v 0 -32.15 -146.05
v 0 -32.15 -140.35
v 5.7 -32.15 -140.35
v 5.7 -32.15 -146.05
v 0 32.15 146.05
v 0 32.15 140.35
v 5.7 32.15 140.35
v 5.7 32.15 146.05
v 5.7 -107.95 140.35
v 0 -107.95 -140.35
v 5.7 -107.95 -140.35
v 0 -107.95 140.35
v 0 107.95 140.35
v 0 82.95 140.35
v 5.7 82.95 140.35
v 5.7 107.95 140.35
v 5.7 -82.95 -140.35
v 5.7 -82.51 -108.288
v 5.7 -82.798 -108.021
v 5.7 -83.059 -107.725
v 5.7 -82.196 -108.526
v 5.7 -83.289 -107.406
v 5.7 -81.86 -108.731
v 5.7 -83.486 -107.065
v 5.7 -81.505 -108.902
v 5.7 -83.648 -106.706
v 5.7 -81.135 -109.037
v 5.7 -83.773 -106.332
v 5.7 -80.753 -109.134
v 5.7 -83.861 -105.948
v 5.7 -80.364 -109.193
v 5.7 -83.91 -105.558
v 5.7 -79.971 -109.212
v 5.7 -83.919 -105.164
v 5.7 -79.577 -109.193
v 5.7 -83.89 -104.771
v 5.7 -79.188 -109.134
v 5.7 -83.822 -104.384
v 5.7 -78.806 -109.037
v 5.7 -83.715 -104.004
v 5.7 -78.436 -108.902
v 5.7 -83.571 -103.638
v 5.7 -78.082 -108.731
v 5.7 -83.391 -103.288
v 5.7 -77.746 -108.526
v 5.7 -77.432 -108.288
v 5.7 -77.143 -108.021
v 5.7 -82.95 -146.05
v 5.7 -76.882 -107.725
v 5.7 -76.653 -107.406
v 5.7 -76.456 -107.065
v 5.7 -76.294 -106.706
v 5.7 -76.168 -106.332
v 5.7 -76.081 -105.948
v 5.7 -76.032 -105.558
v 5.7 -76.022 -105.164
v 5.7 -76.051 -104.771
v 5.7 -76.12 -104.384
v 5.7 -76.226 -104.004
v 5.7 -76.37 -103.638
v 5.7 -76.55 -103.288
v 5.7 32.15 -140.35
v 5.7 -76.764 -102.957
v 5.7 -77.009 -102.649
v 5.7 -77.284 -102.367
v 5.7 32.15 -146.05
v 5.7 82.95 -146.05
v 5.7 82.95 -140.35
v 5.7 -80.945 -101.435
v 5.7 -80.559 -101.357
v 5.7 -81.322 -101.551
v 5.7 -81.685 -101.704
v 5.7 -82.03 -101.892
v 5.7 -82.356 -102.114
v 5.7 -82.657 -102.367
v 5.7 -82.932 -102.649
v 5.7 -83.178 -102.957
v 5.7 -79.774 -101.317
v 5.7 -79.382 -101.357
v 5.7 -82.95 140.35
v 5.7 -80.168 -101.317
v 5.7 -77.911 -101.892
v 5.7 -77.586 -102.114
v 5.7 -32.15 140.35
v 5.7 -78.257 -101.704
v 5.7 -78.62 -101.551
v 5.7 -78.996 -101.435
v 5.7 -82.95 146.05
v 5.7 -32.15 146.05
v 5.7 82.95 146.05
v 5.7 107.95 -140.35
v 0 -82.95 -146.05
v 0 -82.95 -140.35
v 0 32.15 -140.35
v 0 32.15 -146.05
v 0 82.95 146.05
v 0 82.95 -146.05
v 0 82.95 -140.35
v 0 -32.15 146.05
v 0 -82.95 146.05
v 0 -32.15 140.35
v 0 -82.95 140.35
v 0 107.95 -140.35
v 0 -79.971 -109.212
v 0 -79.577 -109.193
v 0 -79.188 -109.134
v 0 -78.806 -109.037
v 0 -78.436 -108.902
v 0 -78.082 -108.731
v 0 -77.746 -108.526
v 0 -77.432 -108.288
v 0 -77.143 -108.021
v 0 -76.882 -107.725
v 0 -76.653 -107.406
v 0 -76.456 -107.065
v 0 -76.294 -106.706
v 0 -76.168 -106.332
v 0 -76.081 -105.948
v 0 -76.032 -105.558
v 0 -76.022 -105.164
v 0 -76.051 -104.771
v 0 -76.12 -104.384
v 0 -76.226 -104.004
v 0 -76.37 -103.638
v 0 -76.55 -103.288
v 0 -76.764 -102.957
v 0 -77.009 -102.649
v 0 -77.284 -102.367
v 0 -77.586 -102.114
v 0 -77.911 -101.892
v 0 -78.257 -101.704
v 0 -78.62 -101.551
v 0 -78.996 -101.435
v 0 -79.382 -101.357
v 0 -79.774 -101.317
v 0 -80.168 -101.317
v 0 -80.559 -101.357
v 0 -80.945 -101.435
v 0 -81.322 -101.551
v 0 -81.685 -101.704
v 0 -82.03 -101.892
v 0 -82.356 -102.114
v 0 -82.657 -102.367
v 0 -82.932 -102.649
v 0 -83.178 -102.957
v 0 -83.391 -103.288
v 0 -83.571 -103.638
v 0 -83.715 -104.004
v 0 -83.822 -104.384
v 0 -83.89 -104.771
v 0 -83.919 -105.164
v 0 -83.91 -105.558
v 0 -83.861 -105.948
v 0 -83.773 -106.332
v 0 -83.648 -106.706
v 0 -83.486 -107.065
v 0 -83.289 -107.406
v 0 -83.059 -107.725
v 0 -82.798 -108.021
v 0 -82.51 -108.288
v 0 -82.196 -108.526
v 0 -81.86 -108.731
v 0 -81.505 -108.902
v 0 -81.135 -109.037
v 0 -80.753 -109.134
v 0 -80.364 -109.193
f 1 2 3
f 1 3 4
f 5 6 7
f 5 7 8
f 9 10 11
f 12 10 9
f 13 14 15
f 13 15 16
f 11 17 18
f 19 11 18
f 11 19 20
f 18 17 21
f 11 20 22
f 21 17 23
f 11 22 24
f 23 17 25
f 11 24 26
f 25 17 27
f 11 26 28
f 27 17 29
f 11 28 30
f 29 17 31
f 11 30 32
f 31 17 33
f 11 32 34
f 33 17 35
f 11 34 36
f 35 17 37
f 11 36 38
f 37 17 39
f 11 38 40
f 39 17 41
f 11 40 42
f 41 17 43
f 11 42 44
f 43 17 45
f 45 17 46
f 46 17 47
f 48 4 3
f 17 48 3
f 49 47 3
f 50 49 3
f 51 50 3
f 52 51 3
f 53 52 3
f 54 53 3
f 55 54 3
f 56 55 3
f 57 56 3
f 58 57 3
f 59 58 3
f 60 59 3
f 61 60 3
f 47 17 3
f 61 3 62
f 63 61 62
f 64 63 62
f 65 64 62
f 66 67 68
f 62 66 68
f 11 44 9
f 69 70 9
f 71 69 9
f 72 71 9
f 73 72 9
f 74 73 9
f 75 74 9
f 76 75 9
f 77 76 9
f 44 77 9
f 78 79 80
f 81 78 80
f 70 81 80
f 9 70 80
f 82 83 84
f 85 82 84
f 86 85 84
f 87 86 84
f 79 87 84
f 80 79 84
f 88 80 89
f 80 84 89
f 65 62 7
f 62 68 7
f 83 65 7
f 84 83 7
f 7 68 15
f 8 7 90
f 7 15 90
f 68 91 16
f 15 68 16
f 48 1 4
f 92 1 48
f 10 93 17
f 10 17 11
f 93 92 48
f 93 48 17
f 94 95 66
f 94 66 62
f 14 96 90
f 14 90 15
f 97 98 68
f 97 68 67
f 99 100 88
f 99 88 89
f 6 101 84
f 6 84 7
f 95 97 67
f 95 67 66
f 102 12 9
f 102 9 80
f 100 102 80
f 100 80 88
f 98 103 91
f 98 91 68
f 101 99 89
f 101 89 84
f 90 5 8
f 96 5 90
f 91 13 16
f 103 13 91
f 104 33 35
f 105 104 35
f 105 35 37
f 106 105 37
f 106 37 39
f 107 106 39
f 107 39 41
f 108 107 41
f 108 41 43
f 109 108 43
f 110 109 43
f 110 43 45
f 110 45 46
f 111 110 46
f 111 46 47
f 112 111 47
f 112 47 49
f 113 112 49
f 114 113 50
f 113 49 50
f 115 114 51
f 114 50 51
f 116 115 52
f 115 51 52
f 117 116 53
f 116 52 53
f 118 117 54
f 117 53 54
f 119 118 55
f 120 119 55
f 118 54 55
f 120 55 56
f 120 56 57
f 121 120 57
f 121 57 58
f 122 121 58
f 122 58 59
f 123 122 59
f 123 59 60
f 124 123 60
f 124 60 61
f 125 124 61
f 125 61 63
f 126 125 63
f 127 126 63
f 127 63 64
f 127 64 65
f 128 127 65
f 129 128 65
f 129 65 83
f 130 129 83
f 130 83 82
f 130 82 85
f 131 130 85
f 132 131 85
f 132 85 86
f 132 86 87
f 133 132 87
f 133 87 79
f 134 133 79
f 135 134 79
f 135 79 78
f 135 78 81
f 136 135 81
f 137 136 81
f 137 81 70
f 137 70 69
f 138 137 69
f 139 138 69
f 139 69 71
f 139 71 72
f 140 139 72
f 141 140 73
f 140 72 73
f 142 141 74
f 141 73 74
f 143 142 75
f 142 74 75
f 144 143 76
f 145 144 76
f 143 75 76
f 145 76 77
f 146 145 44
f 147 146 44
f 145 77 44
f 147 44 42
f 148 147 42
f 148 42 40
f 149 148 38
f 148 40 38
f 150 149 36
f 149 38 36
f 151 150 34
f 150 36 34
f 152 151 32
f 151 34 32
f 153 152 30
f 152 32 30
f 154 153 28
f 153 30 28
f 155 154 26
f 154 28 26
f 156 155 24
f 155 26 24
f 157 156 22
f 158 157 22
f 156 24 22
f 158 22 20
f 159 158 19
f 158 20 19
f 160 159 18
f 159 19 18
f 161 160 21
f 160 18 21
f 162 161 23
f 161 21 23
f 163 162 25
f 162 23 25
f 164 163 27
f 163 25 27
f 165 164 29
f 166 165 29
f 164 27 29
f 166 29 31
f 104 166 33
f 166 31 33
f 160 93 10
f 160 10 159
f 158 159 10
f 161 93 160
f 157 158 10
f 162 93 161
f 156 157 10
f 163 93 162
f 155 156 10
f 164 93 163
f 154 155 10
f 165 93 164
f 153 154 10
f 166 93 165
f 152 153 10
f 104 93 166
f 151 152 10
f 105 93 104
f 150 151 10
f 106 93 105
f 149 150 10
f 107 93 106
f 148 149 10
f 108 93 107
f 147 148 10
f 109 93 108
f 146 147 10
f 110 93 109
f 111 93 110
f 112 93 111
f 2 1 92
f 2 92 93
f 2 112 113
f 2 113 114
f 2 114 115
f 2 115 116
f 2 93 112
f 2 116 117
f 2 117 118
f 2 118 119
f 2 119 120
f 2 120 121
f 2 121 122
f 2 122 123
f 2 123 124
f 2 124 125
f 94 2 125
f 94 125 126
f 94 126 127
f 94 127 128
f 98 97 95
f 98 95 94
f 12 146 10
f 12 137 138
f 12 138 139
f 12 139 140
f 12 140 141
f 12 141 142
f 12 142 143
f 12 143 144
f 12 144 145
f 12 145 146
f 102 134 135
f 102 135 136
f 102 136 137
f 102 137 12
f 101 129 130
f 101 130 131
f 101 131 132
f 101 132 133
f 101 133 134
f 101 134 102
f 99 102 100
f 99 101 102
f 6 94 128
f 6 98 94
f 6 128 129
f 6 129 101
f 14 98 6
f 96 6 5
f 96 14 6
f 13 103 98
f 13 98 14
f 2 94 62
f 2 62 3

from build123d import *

# Parameters (mm, degrees)
BOSS_EXTRUDE1_DEPTH = 5.7
SKETCH2_R           = 3.95
CUT_EXTRUDE1_DEPTH  = 10


with BuildPart() as part:
    # Sketch1 → Boss-Extrude1 (new body)
    with BuildSketch(Plane(origin=(0, 0, 0), x_dir=(0, 0, -1), z_dir=(1, 0, 0))):
        Polygon((-140.35, 82.95), (-140.35, 107.95), (140.35, 107.95), (140.35, 82.95), (146.05, 82.95), (146.05, 32.15), (140.35, 32.15), (140.35, -32.15), (146.05, -32.15), (146.05, -82.95), (140.35, -82.95), (140.35, -107.95), (-140.35, -107.95), (-140.35, -82.95), (-146.05, -82.95), (-146.05, -32.15), (-140.35, -32.15), (-140.35, 32.15), (-146.05, 32.15), (-146.05, 82.95), align=None)
    extrude(amount=BOSS_EXTRUDE1_DEPTH)

    # Sketch2 → Cut-Extrude1 (cut)
    with BuildSketch(Plane(origin=(5.7, 0, 0), x_dir=(0, 0, -1), z_dir=(1, 0, 0))):
        with Locations((105.2625, -79.970674176)):
            Circle(SKETCH2_R)
    extrude(amount=-CUT_EXTRUDE1_DEPTH, mode=Mode.SUBTRACT)


solid = part.part
